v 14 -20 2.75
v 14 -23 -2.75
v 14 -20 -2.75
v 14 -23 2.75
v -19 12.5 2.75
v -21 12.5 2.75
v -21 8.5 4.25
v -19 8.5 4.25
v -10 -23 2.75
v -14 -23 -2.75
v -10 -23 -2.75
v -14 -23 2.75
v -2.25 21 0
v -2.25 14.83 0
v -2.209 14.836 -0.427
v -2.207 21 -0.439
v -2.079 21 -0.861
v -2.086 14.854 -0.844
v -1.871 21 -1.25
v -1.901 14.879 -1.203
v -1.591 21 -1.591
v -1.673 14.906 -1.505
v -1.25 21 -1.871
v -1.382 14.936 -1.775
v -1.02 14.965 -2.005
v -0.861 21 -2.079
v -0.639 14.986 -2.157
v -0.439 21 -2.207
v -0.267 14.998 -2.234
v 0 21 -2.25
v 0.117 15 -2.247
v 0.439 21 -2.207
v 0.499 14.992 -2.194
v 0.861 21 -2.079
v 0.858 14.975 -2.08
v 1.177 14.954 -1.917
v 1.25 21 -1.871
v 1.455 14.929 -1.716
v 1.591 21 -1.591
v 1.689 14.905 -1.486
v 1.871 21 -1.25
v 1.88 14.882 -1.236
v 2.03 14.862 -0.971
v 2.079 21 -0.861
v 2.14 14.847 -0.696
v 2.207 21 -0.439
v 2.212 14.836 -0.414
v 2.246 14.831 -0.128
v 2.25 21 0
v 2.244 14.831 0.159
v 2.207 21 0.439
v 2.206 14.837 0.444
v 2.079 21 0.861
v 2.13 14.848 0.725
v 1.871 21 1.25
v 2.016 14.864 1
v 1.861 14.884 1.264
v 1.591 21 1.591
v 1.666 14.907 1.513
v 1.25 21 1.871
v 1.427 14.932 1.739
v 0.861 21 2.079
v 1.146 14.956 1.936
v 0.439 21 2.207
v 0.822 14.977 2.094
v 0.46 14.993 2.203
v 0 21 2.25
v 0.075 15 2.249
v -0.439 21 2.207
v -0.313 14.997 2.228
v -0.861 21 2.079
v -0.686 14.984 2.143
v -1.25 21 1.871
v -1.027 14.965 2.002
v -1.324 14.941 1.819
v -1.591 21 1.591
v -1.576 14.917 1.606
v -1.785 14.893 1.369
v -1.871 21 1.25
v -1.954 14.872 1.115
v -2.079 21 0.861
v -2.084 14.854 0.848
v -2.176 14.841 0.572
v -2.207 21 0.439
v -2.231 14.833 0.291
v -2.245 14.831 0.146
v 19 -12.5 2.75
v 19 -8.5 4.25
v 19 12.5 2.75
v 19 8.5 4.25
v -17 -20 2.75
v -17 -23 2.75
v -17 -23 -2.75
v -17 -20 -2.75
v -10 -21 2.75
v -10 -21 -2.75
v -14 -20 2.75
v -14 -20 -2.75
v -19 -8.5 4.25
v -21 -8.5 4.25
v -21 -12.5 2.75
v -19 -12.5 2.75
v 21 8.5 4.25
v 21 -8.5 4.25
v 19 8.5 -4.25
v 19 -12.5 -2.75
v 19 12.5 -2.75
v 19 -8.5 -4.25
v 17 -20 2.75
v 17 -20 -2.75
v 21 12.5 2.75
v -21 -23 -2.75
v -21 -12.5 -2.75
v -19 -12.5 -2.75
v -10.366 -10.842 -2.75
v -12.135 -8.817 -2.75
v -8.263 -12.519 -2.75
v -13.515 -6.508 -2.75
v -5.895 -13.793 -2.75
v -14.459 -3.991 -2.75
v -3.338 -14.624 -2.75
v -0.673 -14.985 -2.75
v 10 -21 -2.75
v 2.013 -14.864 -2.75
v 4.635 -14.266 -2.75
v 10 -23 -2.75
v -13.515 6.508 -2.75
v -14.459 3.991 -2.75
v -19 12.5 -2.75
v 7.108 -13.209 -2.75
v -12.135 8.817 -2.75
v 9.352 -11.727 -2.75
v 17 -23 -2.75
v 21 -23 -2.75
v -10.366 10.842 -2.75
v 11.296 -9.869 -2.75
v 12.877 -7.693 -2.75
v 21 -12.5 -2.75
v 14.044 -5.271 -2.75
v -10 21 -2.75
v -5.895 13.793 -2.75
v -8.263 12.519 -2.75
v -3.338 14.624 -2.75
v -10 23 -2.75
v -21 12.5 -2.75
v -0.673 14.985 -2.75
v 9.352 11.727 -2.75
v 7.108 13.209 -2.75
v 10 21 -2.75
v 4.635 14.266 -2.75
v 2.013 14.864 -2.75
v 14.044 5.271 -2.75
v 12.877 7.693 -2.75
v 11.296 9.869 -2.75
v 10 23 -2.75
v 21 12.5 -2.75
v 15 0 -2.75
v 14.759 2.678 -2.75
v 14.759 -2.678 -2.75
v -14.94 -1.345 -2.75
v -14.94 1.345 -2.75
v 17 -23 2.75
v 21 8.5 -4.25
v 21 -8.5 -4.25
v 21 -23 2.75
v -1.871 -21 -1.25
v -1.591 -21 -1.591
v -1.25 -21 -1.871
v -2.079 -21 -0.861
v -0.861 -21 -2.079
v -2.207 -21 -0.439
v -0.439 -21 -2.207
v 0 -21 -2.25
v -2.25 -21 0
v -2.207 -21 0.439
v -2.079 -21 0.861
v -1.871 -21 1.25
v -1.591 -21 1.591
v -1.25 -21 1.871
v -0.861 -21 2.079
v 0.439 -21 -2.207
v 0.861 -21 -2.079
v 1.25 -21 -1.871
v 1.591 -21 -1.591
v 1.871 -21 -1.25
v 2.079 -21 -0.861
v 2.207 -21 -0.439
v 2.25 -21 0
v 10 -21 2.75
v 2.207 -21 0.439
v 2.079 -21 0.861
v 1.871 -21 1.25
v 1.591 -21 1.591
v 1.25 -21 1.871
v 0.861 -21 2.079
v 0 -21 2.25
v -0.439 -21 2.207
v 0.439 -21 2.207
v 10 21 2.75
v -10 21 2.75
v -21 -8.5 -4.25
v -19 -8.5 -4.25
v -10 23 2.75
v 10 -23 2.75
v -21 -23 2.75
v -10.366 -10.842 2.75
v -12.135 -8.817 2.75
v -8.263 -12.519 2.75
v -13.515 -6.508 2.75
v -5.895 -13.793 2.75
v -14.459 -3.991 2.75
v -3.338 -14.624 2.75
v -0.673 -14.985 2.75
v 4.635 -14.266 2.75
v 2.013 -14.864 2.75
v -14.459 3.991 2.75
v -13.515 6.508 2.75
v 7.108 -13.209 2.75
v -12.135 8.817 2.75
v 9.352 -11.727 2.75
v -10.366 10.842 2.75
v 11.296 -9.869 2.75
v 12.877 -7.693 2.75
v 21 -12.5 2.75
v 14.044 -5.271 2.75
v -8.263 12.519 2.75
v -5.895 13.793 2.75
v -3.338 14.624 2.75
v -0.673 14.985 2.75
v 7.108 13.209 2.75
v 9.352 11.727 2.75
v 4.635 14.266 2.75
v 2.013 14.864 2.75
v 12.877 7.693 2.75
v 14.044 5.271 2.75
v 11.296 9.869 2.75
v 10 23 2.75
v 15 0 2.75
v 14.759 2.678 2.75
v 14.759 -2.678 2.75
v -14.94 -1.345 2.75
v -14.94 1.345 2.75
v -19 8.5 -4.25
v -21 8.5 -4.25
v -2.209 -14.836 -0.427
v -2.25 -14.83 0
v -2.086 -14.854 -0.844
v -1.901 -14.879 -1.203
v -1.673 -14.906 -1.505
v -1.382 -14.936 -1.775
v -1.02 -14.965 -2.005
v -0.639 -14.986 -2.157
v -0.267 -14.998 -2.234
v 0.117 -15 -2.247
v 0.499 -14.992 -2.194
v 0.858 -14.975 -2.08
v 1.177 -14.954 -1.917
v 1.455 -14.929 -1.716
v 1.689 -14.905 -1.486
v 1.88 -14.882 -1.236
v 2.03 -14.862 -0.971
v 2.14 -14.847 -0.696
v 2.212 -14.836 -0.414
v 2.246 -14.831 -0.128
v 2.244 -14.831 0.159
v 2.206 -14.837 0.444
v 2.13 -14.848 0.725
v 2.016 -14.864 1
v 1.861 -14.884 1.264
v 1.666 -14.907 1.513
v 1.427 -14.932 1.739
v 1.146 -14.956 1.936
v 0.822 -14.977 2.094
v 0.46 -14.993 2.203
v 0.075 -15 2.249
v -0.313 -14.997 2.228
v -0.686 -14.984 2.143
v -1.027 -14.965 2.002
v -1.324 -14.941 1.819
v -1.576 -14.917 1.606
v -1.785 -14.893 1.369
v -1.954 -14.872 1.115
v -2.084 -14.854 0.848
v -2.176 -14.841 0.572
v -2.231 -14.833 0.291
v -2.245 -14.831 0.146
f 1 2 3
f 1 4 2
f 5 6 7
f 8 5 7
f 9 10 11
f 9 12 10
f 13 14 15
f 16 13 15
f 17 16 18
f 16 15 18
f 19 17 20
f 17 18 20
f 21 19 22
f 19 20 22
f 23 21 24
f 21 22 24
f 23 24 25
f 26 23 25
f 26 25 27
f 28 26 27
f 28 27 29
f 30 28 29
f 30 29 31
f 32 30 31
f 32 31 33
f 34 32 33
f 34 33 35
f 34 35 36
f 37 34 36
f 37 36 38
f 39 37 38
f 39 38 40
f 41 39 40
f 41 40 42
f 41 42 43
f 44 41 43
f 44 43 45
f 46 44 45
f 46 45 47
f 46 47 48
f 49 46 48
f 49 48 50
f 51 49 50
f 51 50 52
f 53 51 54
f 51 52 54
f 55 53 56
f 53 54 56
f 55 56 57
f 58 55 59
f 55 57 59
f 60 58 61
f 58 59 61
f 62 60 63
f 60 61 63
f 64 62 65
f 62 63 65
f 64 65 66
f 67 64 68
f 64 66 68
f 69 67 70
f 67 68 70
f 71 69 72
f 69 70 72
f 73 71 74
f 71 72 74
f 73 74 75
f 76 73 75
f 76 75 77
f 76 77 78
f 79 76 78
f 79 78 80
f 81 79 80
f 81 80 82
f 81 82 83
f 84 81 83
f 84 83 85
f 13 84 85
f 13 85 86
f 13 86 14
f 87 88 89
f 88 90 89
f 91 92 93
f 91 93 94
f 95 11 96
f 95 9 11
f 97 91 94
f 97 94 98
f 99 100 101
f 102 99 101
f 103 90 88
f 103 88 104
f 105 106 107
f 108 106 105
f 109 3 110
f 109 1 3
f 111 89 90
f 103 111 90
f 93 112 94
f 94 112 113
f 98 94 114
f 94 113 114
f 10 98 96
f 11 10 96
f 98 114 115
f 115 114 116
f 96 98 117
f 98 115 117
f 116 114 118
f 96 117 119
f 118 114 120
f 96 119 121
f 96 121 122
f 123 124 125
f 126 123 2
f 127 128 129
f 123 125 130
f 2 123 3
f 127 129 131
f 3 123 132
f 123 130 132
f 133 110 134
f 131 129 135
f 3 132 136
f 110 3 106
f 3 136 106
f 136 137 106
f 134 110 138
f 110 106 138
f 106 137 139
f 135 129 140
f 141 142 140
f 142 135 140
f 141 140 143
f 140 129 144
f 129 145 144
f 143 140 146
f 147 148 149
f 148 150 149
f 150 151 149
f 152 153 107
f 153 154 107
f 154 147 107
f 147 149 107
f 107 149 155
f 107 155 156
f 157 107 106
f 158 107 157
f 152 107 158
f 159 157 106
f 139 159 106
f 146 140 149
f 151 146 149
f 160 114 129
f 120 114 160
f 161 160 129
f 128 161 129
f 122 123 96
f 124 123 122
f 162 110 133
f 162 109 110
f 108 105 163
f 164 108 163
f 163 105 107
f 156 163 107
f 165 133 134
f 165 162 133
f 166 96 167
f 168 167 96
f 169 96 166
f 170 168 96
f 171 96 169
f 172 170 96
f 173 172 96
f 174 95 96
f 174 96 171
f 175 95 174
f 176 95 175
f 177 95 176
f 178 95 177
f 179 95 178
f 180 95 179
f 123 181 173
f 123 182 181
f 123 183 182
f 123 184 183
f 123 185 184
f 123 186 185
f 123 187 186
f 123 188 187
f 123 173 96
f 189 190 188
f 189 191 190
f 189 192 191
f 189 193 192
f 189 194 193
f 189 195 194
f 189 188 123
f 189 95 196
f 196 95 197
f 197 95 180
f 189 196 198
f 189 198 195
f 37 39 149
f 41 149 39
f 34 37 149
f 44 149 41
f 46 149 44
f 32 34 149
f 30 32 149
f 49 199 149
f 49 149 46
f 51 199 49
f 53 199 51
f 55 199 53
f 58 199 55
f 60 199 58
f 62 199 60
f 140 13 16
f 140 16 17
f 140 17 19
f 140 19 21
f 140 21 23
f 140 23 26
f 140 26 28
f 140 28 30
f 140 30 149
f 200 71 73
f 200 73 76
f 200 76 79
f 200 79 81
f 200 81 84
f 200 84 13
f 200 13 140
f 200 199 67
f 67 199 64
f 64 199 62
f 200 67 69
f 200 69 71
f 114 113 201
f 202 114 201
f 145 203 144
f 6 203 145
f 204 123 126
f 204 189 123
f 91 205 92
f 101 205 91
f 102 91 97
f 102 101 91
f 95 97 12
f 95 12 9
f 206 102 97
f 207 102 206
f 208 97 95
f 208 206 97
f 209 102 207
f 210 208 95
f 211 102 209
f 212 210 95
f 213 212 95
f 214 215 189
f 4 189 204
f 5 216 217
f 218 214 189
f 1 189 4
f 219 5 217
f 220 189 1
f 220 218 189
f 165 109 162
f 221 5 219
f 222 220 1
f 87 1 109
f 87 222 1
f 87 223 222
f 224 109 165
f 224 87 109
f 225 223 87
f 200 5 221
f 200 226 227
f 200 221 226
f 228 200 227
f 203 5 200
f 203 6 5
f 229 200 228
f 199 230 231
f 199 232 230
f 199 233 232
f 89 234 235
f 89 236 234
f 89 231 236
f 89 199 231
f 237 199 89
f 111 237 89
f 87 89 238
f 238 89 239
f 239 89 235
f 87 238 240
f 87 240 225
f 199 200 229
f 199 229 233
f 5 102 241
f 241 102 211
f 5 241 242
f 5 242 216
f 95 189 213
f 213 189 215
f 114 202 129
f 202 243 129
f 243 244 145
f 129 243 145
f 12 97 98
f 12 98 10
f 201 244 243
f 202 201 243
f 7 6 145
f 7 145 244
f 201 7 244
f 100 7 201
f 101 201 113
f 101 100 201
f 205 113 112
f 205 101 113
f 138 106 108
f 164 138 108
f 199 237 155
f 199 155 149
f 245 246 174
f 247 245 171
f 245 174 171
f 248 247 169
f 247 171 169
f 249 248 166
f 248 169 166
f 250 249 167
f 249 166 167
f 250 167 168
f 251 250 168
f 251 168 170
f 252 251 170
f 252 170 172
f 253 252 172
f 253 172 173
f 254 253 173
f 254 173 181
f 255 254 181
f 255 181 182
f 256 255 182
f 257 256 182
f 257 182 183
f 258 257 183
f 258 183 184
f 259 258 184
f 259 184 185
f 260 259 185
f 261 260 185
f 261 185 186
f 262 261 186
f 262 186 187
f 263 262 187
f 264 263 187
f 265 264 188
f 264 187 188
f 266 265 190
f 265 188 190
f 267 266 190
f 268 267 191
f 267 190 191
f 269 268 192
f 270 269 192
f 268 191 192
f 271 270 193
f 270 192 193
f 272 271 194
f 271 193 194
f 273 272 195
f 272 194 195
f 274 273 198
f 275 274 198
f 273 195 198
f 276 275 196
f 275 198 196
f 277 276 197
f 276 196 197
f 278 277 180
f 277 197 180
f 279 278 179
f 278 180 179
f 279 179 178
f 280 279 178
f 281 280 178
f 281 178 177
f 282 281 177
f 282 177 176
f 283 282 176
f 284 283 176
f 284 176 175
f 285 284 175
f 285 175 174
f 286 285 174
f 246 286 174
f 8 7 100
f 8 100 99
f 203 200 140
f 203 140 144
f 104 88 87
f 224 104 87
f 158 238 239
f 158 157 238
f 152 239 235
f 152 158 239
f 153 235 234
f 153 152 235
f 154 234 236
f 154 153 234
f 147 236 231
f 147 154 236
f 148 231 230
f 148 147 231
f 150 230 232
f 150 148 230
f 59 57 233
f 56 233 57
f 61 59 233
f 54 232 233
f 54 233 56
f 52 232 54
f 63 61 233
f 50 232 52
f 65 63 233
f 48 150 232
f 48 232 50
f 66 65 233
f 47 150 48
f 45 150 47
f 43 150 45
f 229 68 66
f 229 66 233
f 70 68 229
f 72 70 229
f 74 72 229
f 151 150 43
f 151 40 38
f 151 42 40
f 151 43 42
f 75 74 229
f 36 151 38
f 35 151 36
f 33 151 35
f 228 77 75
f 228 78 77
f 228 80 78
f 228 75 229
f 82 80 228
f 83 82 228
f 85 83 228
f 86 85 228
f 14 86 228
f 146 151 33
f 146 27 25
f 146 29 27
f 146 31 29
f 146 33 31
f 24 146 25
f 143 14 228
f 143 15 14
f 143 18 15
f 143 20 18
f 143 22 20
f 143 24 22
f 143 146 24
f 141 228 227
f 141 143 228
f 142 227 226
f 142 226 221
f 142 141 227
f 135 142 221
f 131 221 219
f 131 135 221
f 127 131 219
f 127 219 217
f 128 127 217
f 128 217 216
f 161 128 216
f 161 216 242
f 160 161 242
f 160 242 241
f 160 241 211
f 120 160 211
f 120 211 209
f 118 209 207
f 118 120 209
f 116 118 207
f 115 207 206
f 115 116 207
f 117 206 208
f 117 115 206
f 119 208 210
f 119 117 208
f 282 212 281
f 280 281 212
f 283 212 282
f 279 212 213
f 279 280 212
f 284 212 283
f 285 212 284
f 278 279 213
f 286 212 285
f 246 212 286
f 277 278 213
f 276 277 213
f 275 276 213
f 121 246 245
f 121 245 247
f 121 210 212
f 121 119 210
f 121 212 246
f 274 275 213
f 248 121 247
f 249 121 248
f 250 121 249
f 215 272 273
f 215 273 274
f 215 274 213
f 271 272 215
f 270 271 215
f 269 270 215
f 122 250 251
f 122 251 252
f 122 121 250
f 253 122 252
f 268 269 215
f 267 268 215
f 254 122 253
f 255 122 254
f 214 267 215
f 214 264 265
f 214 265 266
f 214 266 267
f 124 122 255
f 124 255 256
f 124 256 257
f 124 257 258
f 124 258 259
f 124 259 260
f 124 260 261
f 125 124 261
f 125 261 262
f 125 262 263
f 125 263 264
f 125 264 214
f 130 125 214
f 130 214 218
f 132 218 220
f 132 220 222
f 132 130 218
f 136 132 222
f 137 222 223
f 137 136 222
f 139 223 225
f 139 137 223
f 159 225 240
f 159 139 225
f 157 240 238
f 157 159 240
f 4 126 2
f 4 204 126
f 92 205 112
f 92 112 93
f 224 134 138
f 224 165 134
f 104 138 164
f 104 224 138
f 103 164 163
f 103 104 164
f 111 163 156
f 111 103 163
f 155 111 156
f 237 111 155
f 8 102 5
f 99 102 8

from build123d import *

# Parameters (mm, degrees)
SKETCH1_R            = 15
BOSS_EXTRUDE1_DEPTH  = 2.75
SKETCH1_3_W          = 2
SKETCH1_3_H          = 25
BOSS_EXTRUDE2_DEPTH  = 4.25
CUT_EXTRUDE1_DEPTH   = 49.073511417
M4_CLEARANCE_HOLE1_D = 4.5


with BuildPart() as part:
    # Sketch1 → Boss-Extrude1 (new, symmetric)
    with BuildSketch(Plane.XY):
        Polygon((19, 12.5), (21, 12.5), (10, 23), (10, 21), (-10, 21), (-10, 23), (-21, 12.5), (-19, 12.5), (-19, -12.5), (-21, -12.5), (-21, -23), (-17, -23), (-17, -20), (-14, -20), (-14, -23), (-10, -23), (-10, -21), (10, -21), (10, -23), (14, -23), (14, -20), (17, -20), (17, -23), (21, -23), (21, -12.5), (19, -12.5), align=None)
        Circle(SKETCH1_R, mode=Mode.SUBTRACT)
    extrude(amount=BOSS_EXTRUDE1_DEPTH, both=True)

    # Sketch1<3> → Boss-Extrude2 (add, symmetric)
    with BuildSketch(Plane.XY):
        with Locations((-20, 0)):
            Rectangle(SKETCH1_3_W, SKETCH1_3_H)
        with Locations((20, 0)):
            Rectangle(SKETCH1_3_W, SKETCH1_3_H)
    extrude(amount=BOSS_EXTRUDE2_DEPTH, both=True)

    # Sketch2 → Cut-Extrude1 (cut, through all)
    with BuildSketch(Plane.ZY.offset(21)):
        Polygon((4.25, -12.5), (4.25, -8.5), (2.75, -12.5), align=None)
        Polygon((-2.75, -12.5), (-4.25, -8.5), (-4.25, -12.5), align=None)
        Polygon((-4.25, 8.5), (-2.75, 12.5), (-4.25, 12.5), align=None)
        Polygon((4.25, 12.5), (2.75, 12.5), (4.25, 8.5), align=None)
    extrude(amount=-CUT_EXTRUDE1_DEPTH, mode=Mode.SUBTRACT)

    # M4 Clearance Hole1 (through all)
    with Locations(Plane(origin=(0, 21, 0), x_dir=(1, 0, 0), z_dir=(0, 1, 0))):
        with Locations((0, 0)):
            Hole(M4_CLEARANCE_HOLE1_D / 2)


solid = part.part
